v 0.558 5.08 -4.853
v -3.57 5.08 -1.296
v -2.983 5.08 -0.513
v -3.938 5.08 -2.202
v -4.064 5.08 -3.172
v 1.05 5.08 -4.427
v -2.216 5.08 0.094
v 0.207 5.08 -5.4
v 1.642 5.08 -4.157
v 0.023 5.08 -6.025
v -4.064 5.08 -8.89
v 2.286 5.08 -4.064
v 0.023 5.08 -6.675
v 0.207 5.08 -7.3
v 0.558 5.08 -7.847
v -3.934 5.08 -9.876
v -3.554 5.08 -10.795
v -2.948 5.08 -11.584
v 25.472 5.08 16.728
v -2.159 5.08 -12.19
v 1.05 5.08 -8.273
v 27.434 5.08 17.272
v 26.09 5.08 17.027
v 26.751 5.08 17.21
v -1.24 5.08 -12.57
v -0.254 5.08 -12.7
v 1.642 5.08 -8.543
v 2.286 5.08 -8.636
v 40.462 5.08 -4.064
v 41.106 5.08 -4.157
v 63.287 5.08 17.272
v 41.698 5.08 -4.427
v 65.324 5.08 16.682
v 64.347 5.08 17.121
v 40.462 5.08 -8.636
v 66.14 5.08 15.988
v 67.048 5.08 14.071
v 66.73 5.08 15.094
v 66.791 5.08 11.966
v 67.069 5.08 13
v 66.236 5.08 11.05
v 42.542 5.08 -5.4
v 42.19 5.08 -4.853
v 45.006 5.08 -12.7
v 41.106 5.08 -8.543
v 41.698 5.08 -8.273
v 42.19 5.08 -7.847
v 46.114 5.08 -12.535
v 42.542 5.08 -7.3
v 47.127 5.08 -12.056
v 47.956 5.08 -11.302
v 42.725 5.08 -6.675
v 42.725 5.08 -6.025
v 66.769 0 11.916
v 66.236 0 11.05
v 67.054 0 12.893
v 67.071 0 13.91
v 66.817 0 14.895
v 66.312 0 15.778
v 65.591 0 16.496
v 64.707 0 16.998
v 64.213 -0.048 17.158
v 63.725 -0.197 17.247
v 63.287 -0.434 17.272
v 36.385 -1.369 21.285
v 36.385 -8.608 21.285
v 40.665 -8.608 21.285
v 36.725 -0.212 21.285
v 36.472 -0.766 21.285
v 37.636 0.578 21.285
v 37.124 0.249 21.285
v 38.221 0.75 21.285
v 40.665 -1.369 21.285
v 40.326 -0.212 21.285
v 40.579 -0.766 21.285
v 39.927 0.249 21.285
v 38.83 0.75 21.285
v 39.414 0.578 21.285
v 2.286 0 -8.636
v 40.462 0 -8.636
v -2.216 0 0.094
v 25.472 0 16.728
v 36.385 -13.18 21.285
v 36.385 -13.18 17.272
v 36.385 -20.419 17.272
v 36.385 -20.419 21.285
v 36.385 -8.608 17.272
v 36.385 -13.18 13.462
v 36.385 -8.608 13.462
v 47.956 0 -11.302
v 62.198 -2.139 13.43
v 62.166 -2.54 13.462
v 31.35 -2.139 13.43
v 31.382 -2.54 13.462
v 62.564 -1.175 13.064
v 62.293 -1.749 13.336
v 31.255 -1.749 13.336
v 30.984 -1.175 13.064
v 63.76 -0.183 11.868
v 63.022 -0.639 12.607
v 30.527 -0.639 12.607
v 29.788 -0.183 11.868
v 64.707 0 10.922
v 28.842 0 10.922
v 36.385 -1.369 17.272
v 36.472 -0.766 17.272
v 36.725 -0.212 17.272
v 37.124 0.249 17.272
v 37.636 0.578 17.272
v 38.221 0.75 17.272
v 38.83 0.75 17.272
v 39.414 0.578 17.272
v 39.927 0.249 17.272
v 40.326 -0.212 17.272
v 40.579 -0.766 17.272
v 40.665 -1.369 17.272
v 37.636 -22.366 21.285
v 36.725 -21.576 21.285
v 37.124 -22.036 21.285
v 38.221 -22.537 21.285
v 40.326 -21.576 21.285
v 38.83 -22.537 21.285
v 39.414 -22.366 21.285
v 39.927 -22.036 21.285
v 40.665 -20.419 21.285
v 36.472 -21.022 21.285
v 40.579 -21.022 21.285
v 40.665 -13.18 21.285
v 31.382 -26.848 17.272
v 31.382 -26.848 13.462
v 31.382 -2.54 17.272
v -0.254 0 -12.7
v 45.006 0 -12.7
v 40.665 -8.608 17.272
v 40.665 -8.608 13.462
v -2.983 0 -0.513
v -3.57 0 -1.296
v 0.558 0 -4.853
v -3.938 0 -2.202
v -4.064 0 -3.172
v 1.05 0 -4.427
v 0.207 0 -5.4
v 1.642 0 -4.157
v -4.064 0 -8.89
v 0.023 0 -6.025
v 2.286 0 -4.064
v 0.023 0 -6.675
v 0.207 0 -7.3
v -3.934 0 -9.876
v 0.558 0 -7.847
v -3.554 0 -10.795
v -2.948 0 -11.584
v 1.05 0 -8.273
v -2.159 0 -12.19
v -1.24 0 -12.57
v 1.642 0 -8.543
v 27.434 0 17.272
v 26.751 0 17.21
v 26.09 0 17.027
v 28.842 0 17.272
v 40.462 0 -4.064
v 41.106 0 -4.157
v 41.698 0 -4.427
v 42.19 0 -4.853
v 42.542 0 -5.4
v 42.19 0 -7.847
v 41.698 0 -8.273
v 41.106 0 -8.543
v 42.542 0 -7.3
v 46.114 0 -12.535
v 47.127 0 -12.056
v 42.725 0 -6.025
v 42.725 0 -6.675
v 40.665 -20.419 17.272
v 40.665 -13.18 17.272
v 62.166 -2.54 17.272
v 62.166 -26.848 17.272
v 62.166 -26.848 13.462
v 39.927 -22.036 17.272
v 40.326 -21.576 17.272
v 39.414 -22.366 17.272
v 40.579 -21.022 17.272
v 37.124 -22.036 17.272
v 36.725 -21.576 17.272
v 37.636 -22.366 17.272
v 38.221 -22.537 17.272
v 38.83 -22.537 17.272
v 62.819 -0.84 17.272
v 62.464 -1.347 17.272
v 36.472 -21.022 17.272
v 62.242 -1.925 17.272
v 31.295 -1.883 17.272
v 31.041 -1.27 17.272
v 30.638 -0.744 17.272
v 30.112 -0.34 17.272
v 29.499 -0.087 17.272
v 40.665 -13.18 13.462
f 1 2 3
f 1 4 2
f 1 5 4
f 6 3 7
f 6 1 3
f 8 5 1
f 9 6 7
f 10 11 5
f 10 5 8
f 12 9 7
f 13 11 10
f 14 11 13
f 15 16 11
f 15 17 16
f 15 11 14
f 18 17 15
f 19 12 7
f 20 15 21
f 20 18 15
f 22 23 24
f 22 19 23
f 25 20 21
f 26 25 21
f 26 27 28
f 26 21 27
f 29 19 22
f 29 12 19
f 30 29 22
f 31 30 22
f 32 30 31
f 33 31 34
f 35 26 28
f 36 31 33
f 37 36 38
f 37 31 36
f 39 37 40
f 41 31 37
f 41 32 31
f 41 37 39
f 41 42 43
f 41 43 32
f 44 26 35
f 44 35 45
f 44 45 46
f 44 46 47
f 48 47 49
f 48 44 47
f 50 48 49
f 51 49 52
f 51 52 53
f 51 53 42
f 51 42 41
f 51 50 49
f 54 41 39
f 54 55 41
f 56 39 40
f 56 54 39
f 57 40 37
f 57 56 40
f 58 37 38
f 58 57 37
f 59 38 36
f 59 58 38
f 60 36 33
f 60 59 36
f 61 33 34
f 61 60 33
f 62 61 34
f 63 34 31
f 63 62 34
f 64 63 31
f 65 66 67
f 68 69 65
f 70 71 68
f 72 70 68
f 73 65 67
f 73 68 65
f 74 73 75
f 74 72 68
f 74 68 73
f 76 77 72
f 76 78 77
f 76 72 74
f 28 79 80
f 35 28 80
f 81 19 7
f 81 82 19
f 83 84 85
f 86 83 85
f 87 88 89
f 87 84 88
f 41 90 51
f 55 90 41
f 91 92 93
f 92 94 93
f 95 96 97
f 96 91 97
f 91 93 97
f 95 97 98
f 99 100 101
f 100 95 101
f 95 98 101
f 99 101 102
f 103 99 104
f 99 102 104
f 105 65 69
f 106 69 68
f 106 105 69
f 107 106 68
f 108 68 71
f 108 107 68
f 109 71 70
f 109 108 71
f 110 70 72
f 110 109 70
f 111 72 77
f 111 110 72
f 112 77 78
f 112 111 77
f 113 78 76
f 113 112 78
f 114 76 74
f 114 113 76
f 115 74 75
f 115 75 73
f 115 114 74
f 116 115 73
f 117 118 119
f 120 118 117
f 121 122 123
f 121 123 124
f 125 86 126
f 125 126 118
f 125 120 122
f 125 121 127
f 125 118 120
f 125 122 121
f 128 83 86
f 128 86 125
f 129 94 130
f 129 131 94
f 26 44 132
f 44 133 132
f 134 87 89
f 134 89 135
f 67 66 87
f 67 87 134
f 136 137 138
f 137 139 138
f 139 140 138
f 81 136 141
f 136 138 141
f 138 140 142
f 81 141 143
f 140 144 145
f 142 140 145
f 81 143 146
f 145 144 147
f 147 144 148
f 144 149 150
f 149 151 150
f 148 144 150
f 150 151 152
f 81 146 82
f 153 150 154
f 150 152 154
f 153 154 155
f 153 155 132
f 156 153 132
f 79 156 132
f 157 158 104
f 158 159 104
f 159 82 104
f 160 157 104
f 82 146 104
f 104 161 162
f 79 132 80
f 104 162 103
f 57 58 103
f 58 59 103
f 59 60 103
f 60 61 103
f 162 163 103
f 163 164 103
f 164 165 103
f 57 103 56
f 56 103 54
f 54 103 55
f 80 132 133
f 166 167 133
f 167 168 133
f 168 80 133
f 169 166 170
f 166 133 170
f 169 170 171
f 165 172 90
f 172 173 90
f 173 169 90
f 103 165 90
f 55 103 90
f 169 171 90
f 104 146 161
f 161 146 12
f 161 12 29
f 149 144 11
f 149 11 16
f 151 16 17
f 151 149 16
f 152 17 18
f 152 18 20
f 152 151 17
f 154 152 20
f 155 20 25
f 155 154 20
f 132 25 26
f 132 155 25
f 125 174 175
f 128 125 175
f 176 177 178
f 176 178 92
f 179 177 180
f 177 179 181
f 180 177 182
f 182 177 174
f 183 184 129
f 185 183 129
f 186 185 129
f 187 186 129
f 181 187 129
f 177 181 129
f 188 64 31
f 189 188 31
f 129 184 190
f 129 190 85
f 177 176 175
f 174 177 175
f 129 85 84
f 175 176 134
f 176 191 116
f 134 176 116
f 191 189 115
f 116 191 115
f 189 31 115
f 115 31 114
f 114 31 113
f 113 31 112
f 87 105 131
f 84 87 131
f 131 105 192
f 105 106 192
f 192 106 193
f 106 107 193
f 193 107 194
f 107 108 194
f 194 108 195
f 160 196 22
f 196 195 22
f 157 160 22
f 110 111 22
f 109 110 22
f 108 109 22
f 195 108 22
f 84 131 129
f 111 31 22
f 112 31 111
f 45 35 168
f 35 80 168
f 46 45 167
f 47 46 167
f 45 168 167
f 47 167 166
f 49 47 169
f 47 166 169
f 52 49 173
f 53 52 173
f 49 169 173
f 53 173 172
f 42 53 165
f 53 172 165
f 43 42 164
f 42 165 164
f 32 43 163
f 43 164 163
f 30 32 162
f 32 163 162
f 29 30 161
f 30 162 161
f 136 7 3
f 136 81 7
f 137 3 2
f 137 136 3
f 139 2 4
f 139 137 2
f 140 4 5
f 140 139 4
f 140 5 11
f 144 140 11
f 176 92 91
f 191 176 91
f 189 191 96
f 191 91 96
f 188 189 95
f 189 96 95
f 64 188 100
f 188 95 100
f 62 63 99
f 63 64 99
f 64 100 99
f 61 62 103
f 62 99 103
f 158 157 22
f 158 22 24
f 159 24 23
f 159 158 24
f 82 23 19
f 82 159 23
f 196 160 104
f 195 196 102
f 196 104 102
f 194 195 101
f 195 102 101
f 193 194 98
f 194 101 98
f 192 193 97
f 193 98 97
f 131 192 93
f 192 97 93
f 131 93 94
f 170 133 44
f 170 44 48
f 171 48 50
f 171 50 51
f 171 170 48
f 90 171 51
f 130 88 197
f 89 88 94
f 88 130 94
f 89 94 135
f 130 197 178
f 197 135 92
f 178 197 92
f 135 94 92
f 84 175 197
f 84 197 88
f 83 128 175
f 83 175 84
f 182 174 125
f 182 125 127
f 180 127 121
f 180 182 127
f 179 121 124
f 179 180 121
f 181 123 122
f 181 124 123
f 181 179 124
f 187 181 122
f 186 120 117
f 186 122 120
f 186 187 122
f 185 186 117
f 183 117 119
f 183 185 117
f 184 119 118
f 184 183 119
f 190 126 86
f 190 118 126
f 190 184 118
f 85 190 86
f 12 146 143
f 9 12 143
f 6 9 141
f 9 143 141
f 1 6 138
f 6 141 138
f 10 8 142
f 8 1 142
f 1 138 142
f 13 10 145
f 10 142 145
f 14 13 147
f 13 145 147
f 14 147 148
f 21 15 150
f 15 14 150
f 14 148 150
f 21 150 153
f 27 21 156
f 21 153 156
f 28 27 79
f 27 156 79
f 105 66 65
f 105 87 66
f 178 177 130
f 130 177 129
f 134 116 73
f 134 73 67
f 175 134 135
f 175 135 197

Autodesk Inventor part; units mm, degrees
ref_plane "YZ Plane" through (0, 0, 0) normal (1, 0, 0) x (0, 1, 0)
ref_plane "XZ Plane" through (0, 0, 0) normal (0, 1, 0) x (-1, 0, 0)
ref_plane "XY Plane" through (0, 0, 0) normal (0, 0, 1) x (1, 0, 0)
sketch "Sketch1" plane through (0, 0, 0) normal (0, 1, 0) x (-1, 0, 0)
  line L0 (0, 0) -> (-42.7482, 0)
  line L1 (-42.7482, 0) -> (-42.7482, -12.7)
  line L2 (-42.7482, -12.7) -> (0, -12.7)
  line L3 (0, -12.7) -> (0, 0)
  line L4 (0, -6.35) -> (-42.7482, -6.35)
  circle A0 centre (-2.286, -6.35) radius 2.286
  circle A1 centre (-40.4622, -6.35) radius 2.286
  line L5 (0, 0) -> (4.064, 0)
  line L6 (4.064, 0) -> (4.064, -12.7)
  line L7 (4.064, -12.7) -> (0, -12.7)
  line L8 (0, -12.7) -> (0, 0)
  line L9 (-42.7482, 0) -> (-46.8122, 0)
  line L10 (-46.8122, 0) -> (-46.8122, -12.7)
  line L11 (-46.8122, -12.7) -> (-42.7482, -12.7)
  line L12 (-42.7482, -12.7) -> (-42.7482, 0)
  line L13 (-2.286, -4.064) -> (-40.4622, -4.064)
  line L14 (-2.286, -8.636) -> (-40.4622, -8.636)
  dimension "d0" = 12.7
  dimension "d1" = 42.7482
  dimension "d2" = 4.572
  dimension "d3" = 4.572
  dimension "d4" = 2.286
  dimension "d5" = 2.286
  dimension "d6" = 4.064
  dimension "d7" = 4.064
extrude "Extrusion1" add sketch "Sketch1" along normal blind 5.08 contours L3 A0 L13 A1 L1 L0 | L5 L6 L7 L3 | L1 L11 L10 L9 | L3 L2 L1 A1 L14 A0
sketch "Sketch2" plane through (0, 5.08, 0) normal (0, 1, 0) x (1, 0, 0)
  line L0 (-4.064, 12.7) -> (-4.064, 0) projected
  line L1 (-4.064, 0) -> (46.8122, 0)
  line L2 (46.8122, 0) -> (46.8122, -17.272)
  line L3 (46.8122, -17.272) -> (-4.064, -17.272)
  line L4 (-4.064, -17.272) -> (-4.064, 0)
  point P0 (0, 0)
  point P1 (46.8122, -8.636)
  dimension "d10" = 50.8762
  dimension "d11" = 17.272
extrude "Extrusion2" add sketch "Sketch2" against normal blind 5.08
sketch "Sketch9" plane through (-4.064, 5.08, 17.272) normal (0, 0, 1) x (1, 0, 0)
  line L0 (66.2305, -31.9278) -> (66.2305, -10.0838)
  line L1 (66.2305, -31.9278) -> (35.4457, -31.9278)
  line L2 (35.4457, -10.0838) -> (35.4457, -31.9278)
  line L3 (44.7294, -25.4988) -> (44.7294, -18.2598)
  arc A0 (40.4492, -25.4988) -> (44.7294, -25.4988) centre (42.5893, -25.4988) ccw
  line L4 (40.4492, -18.2598) -> (40.4492, -25.4988)
  line L5 (44.7294, -13.6878) -> (44.7294, -18.2598)
  line L6 (40.4492, -18.2598) -> (40.4492, -13.6878)
  line L7 (40.4492, -13.6878) -> (40.4492, -6.4488)
  arc A1 (44.7294, -6.4488) -> (40.4492, -6.4488) centre (42.5893, -6.4488) ccw
  line L8 (44.7294, -6.4488) -> (44.7294, -13.6878)
  line L9 (40.4492, -13.6878) -> (44.7294, -13.6878)
  line L10 (44.7294, -18.2598) -> (40.4492, -18.2598)
  arc A2 (71.2343, -5.08) -> (66.2305, -10.0838) centre (71.2343, -10.0838) ccw
  arc A3 (35.4457, -10.0838) -> (30.4419, -5.08) centre (30.4419, -10.0838) ccw
  line L11 (40.8305, -31.9278) -> (66.2305, -31.9278)
  line L12 (29.464, -5.08) -> (71.2343, -5.08)
  line L13 (35.4457, -10.0838) -> (35.4457, -5.08)
  line L14 (66.2305, -10.0838) -> (66.2305, -5.08)
  point P0 (40.9442, -5.08)
  point P1 (30.4419, -5.08)
  point P2 (44.2344, -5.08)
  dimension "d43" = 25.4
extrude "Extrusion7" add sketch "Sketch9" against normal blind 3.81 contours L1 L2 L13 L12 A1 L7 L6 L4 A0 L3 L5 L8 L14 L0 | L12 A1 | A1 L8 L9 L7 L12 | L3 A0 L4 L10
extrude "Extrusion8" add sketch "Sketch9" along normal blind 4.0132 contours L12 A1 | A1 L8 L9 L7 L12 | L3 A0 L4 L10
sketch "Sketch10" plane through (46.8122, 0, 17.272) normal (0, 1, 0) x (1, 0, 0)
  line L0 (15.3543, 5.08) -> (20.3581, 5.08) projected
  line L1 (0, 0) -> (0, 29.972) projected
  line L2 (0, 29.972) -> (20.3581, 5.08)
  line L3 (-15.4305, 0) -> (-20.4343, 0) projected
  line L4 (-20.4343, 0) -> (-50.8762, 18.288)
  line L5 (-50.8762, 29.972) -> (-50.8762, 0) projected
  line L6 (0, 29.972) -> (-0.0381, 3.81)
  line L7 (15.3543, 3.81) -> (-15.4305, 3.81) projected
  line L8 (0, 0) -> (20.3581, 0)
  line L9 (20.3581, 0) -> (20.3581, 5.08)
  line L10 (20.3581, 5.08) -> (0, 5.08)
  line L11 (0, 5.08) -> (0, 0)
  line L12 (-50.8762, 29.972) -> (-50.8762, 0) projected
  line L13 (-50.8762, 18.288) -> (-50.8762, 0)
  line L14 (-50.8762, 0) -> (-20.4343, 0)
  point P0 (-46.8122, 17.272)
extrude "Extrusion9" add sketch "Sketch10" along normal blind 5.08 contours L10 L1 L2 L0 | L0 L9 L8 L1 L10
extrude "Extrusion10" cut sketch "Sketch10" along normal blind 5.08 contours L14 L5 L4
fillet "Fillet4" radius 3.81 6 edges at (46.8122, 2.54, -12.7) (-4.064, 2.54, -12.7) (-4.064, 2.54, -1.016) (26.3779, 2.54, 17.272) (67.1703, 2.54, 12.192) (67.1703, 2.54, 17.272)
fillet "Fillet5" radius 2.54 3 edges at (62.1665, 0, 15.367) (46.7741, 0, 13.462) (31.3817, 0, 15.367)
properties part number "Limit Switch Mount"
